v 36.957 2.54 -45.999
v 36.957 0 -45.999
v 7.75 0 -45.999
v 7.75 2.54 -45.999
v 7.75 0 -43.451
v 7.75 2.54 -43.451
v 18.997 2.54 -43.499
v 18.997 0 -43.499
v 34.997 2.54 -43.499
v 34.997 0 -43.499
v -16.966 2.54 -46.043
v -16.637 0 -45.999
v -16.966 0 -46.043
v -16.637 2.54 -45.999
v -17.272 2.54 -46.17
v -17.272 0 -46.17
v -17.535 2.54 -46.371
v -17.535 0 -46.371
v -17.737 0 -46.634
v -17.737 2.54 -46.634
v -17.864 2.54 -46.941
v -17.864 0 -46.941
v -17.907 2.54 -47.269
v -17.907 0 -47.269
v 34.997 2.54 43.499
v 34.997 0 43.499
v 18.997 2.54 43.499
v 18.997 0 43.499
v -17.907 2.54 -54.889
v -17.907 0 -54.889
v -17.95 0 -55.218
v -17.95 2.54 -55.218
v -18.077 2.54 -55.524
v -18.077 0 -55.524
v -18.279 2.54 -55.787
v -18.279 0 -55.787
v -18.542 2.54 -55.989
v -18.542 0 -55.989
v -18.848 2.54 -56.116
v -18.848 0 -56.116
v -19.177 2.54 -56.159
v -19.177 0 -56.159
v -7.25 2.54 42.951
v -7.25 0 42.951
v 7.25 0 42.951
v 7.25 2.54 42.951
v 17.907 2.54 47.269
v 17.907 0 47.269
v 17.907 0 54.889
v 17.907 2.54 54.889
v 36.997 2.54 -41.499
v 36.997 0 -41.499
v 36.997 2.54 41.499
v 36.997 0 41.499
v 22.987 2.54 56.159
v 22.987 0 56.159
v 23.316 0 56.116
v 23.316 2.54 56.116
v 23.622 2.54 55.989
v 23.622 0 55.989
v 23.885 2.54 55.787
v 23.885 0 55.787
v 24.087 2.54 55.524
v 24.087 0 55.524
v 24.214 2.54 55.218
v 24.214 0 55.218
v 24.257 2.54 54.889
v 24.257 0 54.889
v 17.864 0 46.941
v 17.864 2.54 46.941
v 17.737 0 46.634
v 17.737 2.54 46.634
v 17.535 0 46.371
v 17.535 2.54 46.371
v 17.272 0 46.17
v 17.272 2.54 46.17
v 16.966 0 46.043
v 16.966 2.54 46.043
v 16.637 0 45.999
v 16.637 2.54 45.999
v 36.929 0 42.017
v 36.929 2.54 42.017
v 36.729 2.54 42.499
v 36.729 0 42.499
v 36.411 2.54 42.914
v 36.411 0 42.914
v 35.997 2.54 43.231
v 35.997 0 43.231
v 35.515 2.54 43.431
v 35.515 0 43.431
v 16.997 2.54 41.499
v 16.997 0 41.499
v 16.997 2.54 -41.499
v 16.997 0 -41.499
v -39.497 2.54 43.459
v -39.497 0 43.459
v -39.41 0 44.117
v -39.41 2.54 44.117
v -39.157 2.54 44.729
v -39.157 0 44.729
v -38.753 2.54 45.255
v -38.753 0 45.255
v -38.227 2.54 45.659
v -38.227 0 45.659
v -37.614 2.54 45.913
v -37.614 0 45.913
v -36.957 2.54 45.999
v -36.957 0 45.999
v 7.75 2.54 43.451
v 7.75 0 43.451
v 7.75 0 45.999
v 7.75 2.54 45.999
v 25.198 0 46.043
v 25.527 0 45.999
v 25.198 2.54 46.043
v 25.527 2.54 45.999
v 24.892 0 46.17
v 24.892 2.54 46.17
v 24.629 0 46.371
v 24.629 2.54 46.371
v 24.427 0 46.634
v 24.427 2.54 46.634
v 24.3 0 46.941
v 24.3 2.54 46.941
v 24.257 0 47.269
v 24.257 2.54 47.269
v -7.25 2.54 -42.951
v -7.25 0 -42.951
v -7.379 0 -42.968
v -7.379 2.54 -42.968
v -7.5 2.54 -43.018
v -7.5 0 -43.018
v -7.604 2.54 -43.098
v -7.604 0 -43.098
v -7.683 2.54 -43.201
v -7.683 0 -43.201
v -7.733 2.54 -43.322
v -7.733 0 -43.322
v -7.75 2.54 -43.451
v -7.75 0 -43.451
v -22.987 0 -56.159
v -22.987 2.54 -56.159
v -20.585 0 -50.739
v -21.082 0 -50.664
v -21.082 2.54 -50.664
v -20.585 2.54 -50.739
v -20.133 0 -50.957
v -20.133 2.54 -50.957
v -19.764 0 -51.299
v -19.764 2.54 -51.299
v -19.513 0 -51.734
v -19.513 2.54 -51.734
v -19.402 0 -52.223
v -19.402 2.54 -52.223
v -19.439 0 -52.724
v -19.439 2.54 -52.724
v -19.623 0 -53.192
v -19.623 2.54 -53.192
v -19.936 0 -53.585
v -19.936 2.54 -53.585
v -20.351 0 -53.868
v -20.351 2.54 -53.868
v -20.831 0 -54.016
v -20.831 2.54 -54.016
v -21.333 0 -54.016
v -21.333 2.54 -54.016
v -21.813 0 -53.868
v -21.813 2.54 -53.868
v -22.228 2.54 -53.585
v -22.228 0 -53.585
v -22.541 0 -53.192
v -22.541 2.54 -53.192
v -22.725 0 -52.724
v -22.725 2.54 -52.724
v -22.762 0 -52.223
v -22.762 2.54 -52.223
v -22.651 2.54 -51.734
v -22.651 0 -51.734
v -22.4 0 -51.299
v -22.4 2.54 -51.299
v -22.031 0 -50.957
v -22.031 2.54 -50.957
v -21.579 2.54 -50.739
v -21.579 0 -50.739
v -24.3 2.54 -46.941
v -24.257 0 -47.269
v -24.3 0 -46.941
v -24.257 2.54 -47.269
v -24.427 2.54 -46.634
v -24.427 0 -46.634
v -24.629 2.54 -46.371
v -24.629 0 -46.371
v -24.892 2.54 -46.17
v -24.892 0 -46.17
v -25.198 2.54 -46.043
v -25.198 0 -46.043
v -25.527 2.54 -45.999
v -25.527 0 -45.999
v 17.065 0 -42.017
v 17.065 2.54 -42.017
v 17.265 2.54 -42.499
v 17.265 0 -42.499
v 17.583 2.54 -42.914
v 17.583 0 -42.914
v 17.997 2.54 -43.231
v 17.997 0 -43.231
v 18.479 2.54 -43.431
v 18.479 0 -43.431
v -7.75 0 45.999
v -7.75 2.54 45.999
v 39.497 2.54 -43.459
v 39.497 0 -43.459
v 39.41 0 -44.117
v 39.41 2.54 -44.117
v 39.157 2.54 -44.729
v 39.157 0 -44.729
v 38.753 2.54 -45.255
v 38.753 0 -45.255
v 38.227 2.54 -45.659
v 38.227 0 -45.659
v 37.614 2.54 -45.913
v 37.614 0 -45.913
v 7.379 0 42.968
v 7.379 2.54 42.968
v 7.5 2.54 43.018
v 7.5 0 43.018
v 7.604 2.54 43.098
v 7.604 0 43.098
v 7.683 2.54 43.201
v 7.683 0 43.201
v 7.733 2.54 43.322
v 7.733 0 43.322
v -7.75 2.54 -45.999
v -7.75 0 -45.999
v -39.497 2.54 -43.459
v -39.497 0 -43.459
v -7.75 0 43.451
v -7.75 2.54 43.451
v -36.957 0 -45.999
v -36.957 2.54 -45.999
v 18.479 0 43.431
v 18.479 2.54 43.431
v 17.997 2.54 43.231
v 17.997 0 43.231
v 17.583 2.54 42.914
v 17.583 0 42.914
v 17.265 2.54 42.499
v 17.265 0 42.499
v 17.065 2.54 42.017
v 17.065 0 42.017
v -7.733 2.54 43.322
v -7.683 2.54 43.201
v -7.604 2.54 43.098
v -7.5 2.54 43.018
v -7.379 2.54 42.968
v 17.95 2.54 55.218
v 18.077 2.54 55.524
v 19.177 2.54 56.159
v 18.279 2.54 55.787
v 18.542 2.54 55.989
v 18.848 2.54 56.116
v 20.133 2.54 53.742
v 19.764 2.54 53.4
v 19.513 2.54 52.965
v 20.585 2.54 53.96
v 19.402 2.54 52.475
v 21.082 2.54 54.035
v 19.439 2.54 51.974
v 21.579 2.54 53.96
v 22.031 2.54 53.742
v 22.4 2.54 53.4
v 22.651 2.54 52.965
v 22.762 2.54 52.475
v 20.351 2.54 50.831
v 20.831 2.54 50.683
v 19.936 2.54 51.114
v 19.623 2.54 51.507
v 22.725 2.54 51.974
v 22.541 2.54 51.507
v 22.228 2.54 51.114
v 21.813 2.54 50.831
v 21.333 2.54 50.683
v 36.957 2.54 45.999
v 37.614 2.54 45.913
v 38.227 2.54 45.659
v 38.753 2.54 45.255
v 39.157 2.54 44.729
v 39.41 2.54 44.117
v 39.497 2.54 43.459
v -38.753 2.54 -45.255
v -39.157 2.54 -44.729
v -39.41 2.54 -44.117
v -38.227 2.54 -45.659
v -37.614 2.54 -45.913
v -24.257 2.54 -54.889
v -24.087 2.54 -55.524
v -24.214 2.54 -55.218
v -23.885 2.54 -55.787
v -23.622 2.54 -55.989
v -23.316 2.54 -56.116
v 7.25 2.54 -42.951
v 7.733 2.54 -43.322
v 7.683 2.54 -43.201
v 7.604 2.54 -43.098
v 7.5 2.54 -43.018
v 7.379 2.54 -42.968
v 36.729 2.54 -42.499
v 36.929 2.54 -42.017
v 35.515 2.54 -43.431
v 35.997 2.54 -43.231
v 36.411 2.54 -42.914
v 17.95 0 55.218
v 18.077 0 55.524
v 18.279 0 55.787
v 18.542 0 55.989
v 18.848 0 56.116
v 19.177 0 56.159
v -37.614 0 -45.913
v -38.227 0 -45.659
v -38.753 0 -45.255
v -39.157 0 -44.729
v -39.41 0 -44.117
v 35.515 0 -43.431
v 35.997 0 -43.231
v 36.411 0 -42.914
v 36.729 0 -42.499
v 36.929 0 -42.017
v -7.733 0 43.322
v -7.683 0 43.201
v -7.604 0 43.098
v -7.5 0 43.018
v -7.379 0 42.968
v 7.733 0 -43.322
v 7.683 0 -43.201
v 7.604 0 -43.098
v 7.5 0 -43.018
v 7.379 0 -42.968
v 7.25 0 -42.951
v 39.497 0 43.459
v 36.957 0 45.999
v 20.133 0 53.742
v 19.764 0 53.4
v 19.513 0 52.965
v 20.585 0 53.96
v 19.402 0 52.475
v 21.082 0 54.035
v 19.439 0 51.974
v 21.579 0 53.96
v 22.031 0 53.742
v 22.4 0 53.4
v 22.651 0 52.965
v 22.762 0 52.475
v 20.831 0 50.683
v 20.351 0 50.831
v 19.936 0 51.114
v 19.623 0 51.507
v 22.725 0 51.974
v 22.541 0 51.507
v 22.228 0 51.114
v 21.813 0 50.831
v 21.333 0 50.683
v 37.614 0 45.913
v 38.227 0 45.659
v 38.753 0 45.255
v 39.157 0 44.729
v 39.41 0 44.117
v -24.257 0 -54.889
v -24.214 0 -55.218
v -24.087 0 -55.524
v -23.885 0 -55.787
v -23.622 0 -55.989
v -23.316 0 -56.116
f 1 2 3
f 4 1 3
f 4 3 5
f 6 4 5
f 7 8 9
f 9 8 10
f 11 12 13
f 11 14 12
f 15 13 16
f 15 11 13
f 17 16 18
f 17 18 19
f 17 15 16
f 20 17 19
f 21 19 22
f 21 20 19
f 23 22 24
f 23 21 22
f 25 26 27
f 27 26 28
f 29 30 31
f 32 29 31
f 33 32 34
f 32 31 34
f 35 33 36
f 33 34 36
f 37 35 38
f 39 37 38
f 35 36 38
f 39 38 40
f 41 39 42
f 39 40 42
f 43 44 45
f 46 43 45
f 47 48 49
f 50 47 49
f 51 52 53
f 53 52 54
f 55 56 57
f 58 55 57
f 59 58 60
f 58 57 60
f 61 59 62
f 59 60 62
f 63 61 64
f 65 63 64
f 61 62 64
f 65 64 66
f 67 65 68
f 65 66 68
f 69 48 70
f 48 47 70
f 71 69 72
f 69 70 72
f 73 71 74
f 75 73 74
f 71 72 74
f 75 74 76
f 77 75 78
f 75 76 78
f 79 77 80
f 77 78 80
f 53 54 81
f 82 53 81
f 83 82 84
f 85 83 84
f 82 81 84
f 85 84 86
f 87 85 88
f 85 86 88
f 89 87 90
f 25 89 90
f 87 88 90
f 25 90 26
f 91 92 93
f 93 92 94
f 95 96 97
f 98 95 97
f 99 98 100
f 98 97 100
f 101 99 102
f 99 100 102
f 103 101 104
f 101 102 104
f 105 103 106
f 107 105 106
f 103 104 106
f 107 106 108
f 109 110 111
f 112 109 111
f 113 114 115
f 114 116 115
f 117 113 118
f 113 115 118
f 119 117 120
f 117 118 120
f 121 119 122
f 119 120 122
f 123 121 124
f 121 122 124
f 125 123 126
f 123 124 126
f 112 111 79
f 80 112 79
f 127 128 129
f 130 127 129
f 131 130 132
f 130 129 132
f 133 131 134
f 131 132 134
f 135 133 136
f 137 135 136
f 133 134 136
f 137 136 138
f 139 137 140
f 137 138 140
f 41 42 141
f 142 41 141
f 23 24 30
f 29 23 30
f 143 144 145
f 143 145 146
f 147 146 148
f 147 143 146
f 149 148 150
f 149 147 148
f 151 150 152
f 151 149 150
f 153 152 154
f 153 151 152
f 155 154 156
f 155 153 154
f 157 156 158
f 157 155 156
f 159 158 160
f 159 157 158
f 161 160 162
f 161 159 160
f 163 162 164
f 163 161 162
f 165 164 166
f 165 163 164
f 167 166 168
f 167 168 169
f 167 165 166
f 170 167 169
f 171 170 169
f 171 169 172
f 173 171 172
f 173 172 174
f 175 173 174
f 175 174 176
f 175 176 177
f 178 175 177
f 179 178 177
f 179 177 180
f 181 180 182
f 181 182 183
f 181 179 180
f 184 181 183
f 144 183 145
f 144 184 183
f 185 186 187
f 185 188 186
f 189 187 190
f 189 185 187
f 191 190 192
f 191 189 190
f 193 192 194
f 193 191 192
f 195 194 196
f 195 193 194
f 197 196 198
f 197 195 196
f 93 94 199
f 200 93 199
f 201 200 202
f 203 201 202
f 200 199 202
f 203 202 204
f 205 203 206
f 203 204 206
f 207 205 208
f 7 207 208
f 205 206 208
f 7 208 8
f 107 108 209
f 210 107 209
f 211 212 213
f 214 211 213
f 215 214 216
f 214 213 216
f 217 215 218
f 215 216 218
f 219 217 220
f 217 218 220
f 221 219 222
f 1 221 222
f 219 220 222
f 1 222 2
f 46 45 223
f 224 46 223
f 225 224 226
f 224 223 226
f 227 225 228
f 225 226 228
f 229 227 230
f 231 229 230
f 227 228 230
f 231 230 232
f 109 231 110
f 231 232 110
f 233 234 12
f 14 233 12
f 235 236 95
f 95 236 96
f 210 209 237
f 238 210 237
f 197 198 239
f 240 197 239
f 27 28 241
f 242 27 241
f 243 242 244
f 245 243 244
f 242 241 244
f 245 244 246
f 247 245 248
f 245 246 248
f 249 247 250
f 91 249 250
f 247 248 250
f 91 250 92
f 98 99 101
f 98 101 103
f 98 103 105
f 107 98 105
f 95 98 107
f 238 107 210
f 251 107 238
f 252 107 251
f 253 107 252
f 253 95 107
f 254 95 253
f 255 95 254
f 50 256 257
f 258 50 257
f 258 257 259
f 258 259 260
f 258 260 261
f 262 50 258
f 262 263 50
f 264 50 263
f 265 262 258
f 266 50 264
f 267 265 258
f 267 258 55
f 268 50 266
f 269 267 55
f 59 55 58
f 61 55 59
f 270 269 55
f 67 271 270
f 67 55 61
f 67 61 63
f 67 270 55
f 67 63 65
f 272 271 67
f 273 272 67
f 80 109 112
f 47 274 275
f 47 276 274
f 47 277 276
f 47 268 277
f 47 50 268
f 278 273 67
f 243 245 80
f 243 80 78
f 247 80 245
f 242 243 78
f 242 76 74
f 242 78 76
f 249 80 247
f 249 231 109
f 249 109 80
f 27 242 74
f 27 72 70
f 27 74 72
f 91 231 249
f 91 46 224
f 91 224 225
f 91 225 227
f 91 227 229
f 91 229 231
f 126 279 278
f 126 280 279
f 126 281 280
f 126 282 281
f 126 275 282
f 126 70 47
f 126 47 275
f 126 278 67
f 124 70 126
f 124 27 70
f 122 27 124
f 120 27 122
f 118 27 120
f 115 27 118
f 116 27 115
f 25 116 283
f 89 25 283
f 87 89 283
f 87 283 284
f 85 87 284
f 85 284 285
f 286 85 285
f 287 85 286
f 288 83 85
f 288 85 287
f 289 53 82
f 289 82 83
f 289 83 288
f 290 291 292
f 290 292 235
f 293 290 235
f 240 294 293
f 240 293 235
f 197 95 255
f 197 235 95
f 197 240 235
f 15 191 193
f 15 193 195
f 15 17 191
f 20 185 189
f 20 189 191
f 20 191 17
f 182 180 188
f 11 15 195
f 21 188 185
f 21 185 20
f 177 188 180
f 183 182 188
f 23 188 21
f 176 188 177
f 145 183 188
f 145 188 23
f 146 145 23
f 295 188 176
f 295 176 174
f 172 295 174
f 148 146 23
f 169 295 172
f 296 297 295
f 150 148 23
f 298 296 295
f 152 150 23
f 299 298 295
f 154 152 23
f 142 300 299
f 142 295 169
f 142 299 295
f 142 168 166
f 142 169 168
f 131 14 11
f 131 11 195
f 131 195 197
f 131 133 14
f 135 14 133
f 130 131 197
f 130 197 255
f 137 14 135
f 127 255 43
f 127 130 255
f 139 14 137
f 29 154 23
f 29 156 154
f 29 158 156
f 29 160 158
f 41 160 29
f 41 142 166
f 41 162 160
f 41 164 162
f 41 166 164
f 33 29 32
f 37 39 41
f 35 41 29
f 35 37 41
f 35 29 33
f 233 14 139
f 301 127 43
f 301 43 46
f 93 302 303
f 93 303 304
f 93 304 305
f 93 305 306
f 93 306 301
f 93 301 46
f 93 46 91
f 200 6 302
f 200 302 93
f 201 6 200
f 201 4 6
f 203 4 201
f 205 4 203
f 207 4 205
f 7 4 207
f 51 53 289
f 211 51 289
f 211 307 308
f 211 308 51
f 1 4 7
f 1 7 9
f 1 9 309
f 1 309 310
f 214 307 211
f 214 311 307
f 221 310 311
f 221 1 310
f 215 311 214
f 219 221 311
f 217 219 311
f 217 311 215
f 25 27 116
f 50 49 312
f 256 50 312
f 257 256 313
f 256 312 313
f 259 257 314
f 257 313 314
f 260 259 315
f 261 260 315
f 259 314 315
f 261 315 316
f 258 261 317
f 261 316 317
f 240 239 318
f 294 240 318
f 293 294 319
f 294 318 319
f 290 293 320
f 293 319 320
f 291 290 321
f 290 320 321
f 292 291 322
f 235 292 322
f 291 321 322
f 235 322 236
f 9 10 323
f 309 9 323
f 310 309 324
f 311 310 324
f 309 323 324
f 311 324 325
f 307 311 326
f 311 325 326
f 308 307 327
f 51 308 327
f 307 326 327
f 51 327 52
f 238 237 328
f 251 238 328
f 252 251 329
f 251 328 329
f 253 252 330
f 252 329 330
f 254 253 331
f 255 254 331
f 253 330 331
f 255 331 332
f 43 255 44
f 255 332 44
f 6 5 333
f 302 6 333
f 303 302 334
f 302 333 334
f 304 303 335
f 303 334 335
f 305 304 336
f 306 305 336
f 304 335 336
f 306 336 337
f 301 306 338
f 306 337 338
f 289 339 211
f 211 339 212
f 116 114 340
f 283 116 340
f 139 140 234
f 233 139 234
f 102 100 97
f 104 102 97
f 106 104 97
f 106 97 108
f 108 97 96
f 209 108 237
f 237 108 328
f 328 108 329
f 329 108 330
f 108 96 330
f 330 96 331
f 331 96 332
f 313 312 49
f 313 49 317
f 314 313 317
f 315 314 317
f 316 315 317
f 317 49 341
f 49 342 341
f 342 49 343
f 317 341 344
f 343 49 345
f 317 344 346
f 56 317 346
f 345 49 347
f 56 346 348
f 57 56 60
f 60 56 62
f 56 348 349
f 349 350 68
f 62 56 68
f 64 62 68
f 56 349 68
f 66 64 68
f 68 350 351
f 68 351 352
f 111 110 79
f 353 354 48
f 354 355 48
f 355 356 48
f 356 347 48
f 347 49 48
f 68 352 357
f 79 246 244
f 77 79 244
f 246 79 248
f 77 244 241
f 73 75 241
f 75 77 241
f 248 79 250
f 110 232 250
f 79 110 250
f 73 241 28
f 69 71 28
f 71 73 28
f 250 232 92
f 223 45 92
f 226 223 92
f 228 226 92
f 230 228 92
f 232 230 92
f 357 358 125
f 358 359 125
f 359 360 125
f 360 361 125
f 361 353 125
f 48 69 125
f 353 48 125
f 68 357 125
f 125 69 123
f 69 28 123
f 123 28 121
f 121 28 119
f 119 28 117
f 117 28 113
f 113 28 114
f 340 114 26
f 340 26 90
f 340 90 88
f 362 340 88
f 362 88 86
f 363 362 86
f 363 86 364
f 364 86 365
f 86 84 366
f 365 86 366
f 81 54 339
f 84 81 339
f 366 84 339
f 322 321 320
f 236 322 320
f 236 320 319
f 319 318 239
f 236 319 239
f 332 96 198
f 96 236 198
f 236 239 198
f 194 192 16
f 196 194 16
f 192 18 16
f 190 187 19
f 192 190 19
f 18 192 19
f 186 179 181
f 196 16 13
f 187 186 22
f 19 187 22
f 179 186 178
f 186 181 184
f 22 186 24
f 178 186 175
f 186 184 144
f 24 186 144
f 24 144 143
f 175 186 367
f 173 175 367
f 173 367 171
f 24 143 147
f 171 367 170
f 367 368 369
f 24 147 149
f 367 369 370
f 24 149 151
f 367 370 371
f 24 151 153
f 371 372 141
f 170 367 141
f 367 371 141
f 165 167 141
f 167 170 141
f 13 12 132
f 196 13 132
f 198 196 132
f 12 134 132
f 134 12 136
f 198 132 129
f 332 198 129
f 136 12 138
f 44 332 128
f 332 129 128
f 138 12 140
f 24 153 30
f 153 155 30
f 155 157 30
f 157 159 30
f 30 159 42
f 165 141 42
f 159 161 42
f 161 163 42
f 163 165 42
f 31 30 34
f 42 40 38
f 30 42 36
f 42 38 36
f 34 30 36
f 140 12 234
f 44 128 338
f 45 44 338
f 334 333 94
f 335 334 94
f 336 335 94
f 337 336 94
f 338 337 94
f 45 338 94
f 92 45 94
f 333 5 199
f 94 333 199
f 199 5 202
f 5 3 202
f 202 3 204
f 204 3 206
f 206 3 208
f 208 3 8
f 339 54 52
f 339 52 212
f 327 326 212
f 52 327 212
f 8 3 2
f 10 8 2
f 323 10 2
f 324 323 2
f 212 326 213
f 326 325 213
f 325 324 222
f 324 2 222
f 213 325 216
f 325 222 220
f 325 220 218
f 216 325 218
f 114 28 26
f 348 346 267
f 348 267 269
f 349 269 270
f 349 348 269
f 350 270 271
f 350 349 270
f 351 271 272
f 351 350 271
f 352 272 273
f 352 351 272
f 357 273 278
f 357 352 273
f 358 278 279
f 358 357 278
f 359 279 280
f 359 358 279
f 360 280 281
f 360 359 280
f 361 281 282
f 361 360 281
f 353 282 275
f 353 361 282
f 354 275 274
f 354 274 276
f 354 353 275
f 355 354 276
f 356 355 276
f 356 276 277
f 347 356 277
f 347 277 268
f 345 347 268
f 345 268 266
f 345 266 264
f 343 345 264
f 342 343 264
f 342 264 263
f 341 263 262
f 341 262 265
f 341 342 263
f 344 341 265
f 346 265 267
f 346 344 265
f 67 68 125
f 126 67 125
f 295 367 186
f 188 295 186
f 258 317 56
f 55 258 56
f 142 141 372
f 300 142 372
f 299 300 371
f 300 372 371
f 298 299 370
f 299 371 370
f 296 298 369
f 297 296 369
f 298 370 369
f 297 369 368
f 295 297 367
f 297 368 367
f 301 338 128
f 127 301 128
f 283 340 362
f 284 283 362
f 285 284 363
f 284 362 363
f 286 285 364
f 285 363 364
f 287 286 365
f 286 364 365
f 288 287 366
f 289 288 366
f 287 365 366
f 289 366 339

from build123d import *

# Parameters (mm, degrees)
SKETCH1_R           = 1.685173155
BOSS_EXTRUDE2_DEPTH = 2.54
FILLET1_R           = 1.27


with BuildPart() as part:
    # Sketch1 → Boss-Extrude2 (new body)
    with BuildSketch(Plane(origin=(0, 0, 0), x_dir=(1, 0, 0), z_dir=(0, 1, 0))):
        with BuildLine():
            Line((7.25, 42.9514), (-7.25, 42.9514))
            ThreePointArc((-7.25, 42.9514), (-7.603553391, 43.097846609), (-7.75, 43.4514))
            Line((-7.75, 43.4514), (-7.75, 45.9994))
            Line((-7.75, 45.9994), (-17.907, 45.9994))
            Line((-17.907, 45.9994), (-17.907, 54.8894))
            ThreePointArc((-17.907, 54.8894), (-18.278974388, 55.787425612), (-19.177, 56.1594))
            Line((-19.177, 56.1594), (-22.987, 56.1594))
            ThreePointArc((-22.987, 56.1594), (-23.885025612, 55.787425612), (-24.257, 54.8894))
            Line((-24.257, 54.8894), (-24.257, 45.9994))
            Line((-24.257, 45.9994), (-36.957, 45.9994))
            ThreePointArc((-36.957, 45.9994), (-38.753051224, 45.255451224), (-39.497, 43.4594))
            Line((-39.497, 43.4594), (-39.497, -43.4594))
            ThreePointArc((-39.497, -43.4594), (-38.753051224, -45.255451224), (-36.957, -45.9994))
            Line((-36.957, -45.9994), (-7.75, -45.9994))
            Line((-7.75, -45.9994), (-7.75, -43.4514))
            ThreePointArc((-7.75, -43.4514), (-7.603553391, -43.097846609), (-7.25, -42.9514))
            Line((-7.25, -42.9514), (7.25, -42.9514))
            ThreePointArc((7.25, -42.9514), (7.603553391, -43.097846609), (7.75, -43.4514))
            Line((7.75, -43.4514), (7.75, -45.9994))
            Line((7.75, -45.9994), (17.907, -45.9994))
            Line((17.907, -45.9994), (17.907, -54.8894))
            ThreePointArc((17.907, -54.8894), (18.278974388, -55.787425612), (19.177, -56.1594))
            Line((19.177, -56.1594), (22.987, -56.1594))
            ThreePointArc((22.987, -56.1594), (23.885025612, -55.787425612), (24.257, -54.8894))
            Line((24.257, -54.8894), (24.257, -45.9994))
            Line((24.257, -45.9994), (36.957, -45.9994))
            ThreePointArc((36.957, -45.9994), (38.753051224, -45.255451224), (39.497, -43.4594))
            Line((39.497, -43.4594), (39.497, 43.4594))
            ThreePointArc((39.497, 43.4594), (38.753051224, 45.255451224), (36.957, 45.9994))
            Line((36.957, 45.9994), (7.75, 45.9994))
            Line((7.75, 45.9994), (7.75, 43.4514))
            ThreePointArc((7.75, 43.4514), (7.603553391, 43.097846609), (7.25, 42.9514))
        make_face()
        with BuildLine():
            ThreePointArc((16.997, 41.4994), (17.582786438, 42.913613562), (18.997, 43.4994))
            Line((18.997, 43.4994), (34.997, 43.4994))
            ThreePointArc((34.997, 43.4994), (36.411213562, 42.913613562), (36.997, 41.4994))
            Line((36.997, 41.4994), (36.997, -41.4994))
            ThreePointArc((36.997, -41.4994), (36.411213562, -42.913613562), (34.997, -43.4994))
            Line((34.997, -43.4994), (18.997, -43.4994))
            ThreePointArc((18.997, -43.4994), (17.582786438, -42.913613562), (16.997, -41.4994))
            Line((16.997, -41.4994), (16.997, 41.4994))
        make_face(mode=Mode.SUBTRACT)
        with Locations(Location((-21.082, 52.3494, 0), (0, 0, 270))):
            Circle(SKETCH1_R, mode=Mode.SUBTRACT)
        with Locations(Location((21.082, -52.3494, 0), (0, 0, 270))):
            Circle(SKETCH1_R, mode=Mode.SUBTRACT)
    extrude(amount=BOSS_EXTRUDE2_DEPTH)

    # Fillet1
    fillet1_edges = [part.edges().sort_by_distance(p)[0] for p in [
        (-24.257, 1.27, -45.9994),
        (-17.907, 1.27, -45.9994),
        (24.257, 1.27, 45.9994),
        (17.907, 1.27, 45.9994),
    ]]
    fillet(fillet1_edges, radius=FILLET1_R)


solid = part.part
